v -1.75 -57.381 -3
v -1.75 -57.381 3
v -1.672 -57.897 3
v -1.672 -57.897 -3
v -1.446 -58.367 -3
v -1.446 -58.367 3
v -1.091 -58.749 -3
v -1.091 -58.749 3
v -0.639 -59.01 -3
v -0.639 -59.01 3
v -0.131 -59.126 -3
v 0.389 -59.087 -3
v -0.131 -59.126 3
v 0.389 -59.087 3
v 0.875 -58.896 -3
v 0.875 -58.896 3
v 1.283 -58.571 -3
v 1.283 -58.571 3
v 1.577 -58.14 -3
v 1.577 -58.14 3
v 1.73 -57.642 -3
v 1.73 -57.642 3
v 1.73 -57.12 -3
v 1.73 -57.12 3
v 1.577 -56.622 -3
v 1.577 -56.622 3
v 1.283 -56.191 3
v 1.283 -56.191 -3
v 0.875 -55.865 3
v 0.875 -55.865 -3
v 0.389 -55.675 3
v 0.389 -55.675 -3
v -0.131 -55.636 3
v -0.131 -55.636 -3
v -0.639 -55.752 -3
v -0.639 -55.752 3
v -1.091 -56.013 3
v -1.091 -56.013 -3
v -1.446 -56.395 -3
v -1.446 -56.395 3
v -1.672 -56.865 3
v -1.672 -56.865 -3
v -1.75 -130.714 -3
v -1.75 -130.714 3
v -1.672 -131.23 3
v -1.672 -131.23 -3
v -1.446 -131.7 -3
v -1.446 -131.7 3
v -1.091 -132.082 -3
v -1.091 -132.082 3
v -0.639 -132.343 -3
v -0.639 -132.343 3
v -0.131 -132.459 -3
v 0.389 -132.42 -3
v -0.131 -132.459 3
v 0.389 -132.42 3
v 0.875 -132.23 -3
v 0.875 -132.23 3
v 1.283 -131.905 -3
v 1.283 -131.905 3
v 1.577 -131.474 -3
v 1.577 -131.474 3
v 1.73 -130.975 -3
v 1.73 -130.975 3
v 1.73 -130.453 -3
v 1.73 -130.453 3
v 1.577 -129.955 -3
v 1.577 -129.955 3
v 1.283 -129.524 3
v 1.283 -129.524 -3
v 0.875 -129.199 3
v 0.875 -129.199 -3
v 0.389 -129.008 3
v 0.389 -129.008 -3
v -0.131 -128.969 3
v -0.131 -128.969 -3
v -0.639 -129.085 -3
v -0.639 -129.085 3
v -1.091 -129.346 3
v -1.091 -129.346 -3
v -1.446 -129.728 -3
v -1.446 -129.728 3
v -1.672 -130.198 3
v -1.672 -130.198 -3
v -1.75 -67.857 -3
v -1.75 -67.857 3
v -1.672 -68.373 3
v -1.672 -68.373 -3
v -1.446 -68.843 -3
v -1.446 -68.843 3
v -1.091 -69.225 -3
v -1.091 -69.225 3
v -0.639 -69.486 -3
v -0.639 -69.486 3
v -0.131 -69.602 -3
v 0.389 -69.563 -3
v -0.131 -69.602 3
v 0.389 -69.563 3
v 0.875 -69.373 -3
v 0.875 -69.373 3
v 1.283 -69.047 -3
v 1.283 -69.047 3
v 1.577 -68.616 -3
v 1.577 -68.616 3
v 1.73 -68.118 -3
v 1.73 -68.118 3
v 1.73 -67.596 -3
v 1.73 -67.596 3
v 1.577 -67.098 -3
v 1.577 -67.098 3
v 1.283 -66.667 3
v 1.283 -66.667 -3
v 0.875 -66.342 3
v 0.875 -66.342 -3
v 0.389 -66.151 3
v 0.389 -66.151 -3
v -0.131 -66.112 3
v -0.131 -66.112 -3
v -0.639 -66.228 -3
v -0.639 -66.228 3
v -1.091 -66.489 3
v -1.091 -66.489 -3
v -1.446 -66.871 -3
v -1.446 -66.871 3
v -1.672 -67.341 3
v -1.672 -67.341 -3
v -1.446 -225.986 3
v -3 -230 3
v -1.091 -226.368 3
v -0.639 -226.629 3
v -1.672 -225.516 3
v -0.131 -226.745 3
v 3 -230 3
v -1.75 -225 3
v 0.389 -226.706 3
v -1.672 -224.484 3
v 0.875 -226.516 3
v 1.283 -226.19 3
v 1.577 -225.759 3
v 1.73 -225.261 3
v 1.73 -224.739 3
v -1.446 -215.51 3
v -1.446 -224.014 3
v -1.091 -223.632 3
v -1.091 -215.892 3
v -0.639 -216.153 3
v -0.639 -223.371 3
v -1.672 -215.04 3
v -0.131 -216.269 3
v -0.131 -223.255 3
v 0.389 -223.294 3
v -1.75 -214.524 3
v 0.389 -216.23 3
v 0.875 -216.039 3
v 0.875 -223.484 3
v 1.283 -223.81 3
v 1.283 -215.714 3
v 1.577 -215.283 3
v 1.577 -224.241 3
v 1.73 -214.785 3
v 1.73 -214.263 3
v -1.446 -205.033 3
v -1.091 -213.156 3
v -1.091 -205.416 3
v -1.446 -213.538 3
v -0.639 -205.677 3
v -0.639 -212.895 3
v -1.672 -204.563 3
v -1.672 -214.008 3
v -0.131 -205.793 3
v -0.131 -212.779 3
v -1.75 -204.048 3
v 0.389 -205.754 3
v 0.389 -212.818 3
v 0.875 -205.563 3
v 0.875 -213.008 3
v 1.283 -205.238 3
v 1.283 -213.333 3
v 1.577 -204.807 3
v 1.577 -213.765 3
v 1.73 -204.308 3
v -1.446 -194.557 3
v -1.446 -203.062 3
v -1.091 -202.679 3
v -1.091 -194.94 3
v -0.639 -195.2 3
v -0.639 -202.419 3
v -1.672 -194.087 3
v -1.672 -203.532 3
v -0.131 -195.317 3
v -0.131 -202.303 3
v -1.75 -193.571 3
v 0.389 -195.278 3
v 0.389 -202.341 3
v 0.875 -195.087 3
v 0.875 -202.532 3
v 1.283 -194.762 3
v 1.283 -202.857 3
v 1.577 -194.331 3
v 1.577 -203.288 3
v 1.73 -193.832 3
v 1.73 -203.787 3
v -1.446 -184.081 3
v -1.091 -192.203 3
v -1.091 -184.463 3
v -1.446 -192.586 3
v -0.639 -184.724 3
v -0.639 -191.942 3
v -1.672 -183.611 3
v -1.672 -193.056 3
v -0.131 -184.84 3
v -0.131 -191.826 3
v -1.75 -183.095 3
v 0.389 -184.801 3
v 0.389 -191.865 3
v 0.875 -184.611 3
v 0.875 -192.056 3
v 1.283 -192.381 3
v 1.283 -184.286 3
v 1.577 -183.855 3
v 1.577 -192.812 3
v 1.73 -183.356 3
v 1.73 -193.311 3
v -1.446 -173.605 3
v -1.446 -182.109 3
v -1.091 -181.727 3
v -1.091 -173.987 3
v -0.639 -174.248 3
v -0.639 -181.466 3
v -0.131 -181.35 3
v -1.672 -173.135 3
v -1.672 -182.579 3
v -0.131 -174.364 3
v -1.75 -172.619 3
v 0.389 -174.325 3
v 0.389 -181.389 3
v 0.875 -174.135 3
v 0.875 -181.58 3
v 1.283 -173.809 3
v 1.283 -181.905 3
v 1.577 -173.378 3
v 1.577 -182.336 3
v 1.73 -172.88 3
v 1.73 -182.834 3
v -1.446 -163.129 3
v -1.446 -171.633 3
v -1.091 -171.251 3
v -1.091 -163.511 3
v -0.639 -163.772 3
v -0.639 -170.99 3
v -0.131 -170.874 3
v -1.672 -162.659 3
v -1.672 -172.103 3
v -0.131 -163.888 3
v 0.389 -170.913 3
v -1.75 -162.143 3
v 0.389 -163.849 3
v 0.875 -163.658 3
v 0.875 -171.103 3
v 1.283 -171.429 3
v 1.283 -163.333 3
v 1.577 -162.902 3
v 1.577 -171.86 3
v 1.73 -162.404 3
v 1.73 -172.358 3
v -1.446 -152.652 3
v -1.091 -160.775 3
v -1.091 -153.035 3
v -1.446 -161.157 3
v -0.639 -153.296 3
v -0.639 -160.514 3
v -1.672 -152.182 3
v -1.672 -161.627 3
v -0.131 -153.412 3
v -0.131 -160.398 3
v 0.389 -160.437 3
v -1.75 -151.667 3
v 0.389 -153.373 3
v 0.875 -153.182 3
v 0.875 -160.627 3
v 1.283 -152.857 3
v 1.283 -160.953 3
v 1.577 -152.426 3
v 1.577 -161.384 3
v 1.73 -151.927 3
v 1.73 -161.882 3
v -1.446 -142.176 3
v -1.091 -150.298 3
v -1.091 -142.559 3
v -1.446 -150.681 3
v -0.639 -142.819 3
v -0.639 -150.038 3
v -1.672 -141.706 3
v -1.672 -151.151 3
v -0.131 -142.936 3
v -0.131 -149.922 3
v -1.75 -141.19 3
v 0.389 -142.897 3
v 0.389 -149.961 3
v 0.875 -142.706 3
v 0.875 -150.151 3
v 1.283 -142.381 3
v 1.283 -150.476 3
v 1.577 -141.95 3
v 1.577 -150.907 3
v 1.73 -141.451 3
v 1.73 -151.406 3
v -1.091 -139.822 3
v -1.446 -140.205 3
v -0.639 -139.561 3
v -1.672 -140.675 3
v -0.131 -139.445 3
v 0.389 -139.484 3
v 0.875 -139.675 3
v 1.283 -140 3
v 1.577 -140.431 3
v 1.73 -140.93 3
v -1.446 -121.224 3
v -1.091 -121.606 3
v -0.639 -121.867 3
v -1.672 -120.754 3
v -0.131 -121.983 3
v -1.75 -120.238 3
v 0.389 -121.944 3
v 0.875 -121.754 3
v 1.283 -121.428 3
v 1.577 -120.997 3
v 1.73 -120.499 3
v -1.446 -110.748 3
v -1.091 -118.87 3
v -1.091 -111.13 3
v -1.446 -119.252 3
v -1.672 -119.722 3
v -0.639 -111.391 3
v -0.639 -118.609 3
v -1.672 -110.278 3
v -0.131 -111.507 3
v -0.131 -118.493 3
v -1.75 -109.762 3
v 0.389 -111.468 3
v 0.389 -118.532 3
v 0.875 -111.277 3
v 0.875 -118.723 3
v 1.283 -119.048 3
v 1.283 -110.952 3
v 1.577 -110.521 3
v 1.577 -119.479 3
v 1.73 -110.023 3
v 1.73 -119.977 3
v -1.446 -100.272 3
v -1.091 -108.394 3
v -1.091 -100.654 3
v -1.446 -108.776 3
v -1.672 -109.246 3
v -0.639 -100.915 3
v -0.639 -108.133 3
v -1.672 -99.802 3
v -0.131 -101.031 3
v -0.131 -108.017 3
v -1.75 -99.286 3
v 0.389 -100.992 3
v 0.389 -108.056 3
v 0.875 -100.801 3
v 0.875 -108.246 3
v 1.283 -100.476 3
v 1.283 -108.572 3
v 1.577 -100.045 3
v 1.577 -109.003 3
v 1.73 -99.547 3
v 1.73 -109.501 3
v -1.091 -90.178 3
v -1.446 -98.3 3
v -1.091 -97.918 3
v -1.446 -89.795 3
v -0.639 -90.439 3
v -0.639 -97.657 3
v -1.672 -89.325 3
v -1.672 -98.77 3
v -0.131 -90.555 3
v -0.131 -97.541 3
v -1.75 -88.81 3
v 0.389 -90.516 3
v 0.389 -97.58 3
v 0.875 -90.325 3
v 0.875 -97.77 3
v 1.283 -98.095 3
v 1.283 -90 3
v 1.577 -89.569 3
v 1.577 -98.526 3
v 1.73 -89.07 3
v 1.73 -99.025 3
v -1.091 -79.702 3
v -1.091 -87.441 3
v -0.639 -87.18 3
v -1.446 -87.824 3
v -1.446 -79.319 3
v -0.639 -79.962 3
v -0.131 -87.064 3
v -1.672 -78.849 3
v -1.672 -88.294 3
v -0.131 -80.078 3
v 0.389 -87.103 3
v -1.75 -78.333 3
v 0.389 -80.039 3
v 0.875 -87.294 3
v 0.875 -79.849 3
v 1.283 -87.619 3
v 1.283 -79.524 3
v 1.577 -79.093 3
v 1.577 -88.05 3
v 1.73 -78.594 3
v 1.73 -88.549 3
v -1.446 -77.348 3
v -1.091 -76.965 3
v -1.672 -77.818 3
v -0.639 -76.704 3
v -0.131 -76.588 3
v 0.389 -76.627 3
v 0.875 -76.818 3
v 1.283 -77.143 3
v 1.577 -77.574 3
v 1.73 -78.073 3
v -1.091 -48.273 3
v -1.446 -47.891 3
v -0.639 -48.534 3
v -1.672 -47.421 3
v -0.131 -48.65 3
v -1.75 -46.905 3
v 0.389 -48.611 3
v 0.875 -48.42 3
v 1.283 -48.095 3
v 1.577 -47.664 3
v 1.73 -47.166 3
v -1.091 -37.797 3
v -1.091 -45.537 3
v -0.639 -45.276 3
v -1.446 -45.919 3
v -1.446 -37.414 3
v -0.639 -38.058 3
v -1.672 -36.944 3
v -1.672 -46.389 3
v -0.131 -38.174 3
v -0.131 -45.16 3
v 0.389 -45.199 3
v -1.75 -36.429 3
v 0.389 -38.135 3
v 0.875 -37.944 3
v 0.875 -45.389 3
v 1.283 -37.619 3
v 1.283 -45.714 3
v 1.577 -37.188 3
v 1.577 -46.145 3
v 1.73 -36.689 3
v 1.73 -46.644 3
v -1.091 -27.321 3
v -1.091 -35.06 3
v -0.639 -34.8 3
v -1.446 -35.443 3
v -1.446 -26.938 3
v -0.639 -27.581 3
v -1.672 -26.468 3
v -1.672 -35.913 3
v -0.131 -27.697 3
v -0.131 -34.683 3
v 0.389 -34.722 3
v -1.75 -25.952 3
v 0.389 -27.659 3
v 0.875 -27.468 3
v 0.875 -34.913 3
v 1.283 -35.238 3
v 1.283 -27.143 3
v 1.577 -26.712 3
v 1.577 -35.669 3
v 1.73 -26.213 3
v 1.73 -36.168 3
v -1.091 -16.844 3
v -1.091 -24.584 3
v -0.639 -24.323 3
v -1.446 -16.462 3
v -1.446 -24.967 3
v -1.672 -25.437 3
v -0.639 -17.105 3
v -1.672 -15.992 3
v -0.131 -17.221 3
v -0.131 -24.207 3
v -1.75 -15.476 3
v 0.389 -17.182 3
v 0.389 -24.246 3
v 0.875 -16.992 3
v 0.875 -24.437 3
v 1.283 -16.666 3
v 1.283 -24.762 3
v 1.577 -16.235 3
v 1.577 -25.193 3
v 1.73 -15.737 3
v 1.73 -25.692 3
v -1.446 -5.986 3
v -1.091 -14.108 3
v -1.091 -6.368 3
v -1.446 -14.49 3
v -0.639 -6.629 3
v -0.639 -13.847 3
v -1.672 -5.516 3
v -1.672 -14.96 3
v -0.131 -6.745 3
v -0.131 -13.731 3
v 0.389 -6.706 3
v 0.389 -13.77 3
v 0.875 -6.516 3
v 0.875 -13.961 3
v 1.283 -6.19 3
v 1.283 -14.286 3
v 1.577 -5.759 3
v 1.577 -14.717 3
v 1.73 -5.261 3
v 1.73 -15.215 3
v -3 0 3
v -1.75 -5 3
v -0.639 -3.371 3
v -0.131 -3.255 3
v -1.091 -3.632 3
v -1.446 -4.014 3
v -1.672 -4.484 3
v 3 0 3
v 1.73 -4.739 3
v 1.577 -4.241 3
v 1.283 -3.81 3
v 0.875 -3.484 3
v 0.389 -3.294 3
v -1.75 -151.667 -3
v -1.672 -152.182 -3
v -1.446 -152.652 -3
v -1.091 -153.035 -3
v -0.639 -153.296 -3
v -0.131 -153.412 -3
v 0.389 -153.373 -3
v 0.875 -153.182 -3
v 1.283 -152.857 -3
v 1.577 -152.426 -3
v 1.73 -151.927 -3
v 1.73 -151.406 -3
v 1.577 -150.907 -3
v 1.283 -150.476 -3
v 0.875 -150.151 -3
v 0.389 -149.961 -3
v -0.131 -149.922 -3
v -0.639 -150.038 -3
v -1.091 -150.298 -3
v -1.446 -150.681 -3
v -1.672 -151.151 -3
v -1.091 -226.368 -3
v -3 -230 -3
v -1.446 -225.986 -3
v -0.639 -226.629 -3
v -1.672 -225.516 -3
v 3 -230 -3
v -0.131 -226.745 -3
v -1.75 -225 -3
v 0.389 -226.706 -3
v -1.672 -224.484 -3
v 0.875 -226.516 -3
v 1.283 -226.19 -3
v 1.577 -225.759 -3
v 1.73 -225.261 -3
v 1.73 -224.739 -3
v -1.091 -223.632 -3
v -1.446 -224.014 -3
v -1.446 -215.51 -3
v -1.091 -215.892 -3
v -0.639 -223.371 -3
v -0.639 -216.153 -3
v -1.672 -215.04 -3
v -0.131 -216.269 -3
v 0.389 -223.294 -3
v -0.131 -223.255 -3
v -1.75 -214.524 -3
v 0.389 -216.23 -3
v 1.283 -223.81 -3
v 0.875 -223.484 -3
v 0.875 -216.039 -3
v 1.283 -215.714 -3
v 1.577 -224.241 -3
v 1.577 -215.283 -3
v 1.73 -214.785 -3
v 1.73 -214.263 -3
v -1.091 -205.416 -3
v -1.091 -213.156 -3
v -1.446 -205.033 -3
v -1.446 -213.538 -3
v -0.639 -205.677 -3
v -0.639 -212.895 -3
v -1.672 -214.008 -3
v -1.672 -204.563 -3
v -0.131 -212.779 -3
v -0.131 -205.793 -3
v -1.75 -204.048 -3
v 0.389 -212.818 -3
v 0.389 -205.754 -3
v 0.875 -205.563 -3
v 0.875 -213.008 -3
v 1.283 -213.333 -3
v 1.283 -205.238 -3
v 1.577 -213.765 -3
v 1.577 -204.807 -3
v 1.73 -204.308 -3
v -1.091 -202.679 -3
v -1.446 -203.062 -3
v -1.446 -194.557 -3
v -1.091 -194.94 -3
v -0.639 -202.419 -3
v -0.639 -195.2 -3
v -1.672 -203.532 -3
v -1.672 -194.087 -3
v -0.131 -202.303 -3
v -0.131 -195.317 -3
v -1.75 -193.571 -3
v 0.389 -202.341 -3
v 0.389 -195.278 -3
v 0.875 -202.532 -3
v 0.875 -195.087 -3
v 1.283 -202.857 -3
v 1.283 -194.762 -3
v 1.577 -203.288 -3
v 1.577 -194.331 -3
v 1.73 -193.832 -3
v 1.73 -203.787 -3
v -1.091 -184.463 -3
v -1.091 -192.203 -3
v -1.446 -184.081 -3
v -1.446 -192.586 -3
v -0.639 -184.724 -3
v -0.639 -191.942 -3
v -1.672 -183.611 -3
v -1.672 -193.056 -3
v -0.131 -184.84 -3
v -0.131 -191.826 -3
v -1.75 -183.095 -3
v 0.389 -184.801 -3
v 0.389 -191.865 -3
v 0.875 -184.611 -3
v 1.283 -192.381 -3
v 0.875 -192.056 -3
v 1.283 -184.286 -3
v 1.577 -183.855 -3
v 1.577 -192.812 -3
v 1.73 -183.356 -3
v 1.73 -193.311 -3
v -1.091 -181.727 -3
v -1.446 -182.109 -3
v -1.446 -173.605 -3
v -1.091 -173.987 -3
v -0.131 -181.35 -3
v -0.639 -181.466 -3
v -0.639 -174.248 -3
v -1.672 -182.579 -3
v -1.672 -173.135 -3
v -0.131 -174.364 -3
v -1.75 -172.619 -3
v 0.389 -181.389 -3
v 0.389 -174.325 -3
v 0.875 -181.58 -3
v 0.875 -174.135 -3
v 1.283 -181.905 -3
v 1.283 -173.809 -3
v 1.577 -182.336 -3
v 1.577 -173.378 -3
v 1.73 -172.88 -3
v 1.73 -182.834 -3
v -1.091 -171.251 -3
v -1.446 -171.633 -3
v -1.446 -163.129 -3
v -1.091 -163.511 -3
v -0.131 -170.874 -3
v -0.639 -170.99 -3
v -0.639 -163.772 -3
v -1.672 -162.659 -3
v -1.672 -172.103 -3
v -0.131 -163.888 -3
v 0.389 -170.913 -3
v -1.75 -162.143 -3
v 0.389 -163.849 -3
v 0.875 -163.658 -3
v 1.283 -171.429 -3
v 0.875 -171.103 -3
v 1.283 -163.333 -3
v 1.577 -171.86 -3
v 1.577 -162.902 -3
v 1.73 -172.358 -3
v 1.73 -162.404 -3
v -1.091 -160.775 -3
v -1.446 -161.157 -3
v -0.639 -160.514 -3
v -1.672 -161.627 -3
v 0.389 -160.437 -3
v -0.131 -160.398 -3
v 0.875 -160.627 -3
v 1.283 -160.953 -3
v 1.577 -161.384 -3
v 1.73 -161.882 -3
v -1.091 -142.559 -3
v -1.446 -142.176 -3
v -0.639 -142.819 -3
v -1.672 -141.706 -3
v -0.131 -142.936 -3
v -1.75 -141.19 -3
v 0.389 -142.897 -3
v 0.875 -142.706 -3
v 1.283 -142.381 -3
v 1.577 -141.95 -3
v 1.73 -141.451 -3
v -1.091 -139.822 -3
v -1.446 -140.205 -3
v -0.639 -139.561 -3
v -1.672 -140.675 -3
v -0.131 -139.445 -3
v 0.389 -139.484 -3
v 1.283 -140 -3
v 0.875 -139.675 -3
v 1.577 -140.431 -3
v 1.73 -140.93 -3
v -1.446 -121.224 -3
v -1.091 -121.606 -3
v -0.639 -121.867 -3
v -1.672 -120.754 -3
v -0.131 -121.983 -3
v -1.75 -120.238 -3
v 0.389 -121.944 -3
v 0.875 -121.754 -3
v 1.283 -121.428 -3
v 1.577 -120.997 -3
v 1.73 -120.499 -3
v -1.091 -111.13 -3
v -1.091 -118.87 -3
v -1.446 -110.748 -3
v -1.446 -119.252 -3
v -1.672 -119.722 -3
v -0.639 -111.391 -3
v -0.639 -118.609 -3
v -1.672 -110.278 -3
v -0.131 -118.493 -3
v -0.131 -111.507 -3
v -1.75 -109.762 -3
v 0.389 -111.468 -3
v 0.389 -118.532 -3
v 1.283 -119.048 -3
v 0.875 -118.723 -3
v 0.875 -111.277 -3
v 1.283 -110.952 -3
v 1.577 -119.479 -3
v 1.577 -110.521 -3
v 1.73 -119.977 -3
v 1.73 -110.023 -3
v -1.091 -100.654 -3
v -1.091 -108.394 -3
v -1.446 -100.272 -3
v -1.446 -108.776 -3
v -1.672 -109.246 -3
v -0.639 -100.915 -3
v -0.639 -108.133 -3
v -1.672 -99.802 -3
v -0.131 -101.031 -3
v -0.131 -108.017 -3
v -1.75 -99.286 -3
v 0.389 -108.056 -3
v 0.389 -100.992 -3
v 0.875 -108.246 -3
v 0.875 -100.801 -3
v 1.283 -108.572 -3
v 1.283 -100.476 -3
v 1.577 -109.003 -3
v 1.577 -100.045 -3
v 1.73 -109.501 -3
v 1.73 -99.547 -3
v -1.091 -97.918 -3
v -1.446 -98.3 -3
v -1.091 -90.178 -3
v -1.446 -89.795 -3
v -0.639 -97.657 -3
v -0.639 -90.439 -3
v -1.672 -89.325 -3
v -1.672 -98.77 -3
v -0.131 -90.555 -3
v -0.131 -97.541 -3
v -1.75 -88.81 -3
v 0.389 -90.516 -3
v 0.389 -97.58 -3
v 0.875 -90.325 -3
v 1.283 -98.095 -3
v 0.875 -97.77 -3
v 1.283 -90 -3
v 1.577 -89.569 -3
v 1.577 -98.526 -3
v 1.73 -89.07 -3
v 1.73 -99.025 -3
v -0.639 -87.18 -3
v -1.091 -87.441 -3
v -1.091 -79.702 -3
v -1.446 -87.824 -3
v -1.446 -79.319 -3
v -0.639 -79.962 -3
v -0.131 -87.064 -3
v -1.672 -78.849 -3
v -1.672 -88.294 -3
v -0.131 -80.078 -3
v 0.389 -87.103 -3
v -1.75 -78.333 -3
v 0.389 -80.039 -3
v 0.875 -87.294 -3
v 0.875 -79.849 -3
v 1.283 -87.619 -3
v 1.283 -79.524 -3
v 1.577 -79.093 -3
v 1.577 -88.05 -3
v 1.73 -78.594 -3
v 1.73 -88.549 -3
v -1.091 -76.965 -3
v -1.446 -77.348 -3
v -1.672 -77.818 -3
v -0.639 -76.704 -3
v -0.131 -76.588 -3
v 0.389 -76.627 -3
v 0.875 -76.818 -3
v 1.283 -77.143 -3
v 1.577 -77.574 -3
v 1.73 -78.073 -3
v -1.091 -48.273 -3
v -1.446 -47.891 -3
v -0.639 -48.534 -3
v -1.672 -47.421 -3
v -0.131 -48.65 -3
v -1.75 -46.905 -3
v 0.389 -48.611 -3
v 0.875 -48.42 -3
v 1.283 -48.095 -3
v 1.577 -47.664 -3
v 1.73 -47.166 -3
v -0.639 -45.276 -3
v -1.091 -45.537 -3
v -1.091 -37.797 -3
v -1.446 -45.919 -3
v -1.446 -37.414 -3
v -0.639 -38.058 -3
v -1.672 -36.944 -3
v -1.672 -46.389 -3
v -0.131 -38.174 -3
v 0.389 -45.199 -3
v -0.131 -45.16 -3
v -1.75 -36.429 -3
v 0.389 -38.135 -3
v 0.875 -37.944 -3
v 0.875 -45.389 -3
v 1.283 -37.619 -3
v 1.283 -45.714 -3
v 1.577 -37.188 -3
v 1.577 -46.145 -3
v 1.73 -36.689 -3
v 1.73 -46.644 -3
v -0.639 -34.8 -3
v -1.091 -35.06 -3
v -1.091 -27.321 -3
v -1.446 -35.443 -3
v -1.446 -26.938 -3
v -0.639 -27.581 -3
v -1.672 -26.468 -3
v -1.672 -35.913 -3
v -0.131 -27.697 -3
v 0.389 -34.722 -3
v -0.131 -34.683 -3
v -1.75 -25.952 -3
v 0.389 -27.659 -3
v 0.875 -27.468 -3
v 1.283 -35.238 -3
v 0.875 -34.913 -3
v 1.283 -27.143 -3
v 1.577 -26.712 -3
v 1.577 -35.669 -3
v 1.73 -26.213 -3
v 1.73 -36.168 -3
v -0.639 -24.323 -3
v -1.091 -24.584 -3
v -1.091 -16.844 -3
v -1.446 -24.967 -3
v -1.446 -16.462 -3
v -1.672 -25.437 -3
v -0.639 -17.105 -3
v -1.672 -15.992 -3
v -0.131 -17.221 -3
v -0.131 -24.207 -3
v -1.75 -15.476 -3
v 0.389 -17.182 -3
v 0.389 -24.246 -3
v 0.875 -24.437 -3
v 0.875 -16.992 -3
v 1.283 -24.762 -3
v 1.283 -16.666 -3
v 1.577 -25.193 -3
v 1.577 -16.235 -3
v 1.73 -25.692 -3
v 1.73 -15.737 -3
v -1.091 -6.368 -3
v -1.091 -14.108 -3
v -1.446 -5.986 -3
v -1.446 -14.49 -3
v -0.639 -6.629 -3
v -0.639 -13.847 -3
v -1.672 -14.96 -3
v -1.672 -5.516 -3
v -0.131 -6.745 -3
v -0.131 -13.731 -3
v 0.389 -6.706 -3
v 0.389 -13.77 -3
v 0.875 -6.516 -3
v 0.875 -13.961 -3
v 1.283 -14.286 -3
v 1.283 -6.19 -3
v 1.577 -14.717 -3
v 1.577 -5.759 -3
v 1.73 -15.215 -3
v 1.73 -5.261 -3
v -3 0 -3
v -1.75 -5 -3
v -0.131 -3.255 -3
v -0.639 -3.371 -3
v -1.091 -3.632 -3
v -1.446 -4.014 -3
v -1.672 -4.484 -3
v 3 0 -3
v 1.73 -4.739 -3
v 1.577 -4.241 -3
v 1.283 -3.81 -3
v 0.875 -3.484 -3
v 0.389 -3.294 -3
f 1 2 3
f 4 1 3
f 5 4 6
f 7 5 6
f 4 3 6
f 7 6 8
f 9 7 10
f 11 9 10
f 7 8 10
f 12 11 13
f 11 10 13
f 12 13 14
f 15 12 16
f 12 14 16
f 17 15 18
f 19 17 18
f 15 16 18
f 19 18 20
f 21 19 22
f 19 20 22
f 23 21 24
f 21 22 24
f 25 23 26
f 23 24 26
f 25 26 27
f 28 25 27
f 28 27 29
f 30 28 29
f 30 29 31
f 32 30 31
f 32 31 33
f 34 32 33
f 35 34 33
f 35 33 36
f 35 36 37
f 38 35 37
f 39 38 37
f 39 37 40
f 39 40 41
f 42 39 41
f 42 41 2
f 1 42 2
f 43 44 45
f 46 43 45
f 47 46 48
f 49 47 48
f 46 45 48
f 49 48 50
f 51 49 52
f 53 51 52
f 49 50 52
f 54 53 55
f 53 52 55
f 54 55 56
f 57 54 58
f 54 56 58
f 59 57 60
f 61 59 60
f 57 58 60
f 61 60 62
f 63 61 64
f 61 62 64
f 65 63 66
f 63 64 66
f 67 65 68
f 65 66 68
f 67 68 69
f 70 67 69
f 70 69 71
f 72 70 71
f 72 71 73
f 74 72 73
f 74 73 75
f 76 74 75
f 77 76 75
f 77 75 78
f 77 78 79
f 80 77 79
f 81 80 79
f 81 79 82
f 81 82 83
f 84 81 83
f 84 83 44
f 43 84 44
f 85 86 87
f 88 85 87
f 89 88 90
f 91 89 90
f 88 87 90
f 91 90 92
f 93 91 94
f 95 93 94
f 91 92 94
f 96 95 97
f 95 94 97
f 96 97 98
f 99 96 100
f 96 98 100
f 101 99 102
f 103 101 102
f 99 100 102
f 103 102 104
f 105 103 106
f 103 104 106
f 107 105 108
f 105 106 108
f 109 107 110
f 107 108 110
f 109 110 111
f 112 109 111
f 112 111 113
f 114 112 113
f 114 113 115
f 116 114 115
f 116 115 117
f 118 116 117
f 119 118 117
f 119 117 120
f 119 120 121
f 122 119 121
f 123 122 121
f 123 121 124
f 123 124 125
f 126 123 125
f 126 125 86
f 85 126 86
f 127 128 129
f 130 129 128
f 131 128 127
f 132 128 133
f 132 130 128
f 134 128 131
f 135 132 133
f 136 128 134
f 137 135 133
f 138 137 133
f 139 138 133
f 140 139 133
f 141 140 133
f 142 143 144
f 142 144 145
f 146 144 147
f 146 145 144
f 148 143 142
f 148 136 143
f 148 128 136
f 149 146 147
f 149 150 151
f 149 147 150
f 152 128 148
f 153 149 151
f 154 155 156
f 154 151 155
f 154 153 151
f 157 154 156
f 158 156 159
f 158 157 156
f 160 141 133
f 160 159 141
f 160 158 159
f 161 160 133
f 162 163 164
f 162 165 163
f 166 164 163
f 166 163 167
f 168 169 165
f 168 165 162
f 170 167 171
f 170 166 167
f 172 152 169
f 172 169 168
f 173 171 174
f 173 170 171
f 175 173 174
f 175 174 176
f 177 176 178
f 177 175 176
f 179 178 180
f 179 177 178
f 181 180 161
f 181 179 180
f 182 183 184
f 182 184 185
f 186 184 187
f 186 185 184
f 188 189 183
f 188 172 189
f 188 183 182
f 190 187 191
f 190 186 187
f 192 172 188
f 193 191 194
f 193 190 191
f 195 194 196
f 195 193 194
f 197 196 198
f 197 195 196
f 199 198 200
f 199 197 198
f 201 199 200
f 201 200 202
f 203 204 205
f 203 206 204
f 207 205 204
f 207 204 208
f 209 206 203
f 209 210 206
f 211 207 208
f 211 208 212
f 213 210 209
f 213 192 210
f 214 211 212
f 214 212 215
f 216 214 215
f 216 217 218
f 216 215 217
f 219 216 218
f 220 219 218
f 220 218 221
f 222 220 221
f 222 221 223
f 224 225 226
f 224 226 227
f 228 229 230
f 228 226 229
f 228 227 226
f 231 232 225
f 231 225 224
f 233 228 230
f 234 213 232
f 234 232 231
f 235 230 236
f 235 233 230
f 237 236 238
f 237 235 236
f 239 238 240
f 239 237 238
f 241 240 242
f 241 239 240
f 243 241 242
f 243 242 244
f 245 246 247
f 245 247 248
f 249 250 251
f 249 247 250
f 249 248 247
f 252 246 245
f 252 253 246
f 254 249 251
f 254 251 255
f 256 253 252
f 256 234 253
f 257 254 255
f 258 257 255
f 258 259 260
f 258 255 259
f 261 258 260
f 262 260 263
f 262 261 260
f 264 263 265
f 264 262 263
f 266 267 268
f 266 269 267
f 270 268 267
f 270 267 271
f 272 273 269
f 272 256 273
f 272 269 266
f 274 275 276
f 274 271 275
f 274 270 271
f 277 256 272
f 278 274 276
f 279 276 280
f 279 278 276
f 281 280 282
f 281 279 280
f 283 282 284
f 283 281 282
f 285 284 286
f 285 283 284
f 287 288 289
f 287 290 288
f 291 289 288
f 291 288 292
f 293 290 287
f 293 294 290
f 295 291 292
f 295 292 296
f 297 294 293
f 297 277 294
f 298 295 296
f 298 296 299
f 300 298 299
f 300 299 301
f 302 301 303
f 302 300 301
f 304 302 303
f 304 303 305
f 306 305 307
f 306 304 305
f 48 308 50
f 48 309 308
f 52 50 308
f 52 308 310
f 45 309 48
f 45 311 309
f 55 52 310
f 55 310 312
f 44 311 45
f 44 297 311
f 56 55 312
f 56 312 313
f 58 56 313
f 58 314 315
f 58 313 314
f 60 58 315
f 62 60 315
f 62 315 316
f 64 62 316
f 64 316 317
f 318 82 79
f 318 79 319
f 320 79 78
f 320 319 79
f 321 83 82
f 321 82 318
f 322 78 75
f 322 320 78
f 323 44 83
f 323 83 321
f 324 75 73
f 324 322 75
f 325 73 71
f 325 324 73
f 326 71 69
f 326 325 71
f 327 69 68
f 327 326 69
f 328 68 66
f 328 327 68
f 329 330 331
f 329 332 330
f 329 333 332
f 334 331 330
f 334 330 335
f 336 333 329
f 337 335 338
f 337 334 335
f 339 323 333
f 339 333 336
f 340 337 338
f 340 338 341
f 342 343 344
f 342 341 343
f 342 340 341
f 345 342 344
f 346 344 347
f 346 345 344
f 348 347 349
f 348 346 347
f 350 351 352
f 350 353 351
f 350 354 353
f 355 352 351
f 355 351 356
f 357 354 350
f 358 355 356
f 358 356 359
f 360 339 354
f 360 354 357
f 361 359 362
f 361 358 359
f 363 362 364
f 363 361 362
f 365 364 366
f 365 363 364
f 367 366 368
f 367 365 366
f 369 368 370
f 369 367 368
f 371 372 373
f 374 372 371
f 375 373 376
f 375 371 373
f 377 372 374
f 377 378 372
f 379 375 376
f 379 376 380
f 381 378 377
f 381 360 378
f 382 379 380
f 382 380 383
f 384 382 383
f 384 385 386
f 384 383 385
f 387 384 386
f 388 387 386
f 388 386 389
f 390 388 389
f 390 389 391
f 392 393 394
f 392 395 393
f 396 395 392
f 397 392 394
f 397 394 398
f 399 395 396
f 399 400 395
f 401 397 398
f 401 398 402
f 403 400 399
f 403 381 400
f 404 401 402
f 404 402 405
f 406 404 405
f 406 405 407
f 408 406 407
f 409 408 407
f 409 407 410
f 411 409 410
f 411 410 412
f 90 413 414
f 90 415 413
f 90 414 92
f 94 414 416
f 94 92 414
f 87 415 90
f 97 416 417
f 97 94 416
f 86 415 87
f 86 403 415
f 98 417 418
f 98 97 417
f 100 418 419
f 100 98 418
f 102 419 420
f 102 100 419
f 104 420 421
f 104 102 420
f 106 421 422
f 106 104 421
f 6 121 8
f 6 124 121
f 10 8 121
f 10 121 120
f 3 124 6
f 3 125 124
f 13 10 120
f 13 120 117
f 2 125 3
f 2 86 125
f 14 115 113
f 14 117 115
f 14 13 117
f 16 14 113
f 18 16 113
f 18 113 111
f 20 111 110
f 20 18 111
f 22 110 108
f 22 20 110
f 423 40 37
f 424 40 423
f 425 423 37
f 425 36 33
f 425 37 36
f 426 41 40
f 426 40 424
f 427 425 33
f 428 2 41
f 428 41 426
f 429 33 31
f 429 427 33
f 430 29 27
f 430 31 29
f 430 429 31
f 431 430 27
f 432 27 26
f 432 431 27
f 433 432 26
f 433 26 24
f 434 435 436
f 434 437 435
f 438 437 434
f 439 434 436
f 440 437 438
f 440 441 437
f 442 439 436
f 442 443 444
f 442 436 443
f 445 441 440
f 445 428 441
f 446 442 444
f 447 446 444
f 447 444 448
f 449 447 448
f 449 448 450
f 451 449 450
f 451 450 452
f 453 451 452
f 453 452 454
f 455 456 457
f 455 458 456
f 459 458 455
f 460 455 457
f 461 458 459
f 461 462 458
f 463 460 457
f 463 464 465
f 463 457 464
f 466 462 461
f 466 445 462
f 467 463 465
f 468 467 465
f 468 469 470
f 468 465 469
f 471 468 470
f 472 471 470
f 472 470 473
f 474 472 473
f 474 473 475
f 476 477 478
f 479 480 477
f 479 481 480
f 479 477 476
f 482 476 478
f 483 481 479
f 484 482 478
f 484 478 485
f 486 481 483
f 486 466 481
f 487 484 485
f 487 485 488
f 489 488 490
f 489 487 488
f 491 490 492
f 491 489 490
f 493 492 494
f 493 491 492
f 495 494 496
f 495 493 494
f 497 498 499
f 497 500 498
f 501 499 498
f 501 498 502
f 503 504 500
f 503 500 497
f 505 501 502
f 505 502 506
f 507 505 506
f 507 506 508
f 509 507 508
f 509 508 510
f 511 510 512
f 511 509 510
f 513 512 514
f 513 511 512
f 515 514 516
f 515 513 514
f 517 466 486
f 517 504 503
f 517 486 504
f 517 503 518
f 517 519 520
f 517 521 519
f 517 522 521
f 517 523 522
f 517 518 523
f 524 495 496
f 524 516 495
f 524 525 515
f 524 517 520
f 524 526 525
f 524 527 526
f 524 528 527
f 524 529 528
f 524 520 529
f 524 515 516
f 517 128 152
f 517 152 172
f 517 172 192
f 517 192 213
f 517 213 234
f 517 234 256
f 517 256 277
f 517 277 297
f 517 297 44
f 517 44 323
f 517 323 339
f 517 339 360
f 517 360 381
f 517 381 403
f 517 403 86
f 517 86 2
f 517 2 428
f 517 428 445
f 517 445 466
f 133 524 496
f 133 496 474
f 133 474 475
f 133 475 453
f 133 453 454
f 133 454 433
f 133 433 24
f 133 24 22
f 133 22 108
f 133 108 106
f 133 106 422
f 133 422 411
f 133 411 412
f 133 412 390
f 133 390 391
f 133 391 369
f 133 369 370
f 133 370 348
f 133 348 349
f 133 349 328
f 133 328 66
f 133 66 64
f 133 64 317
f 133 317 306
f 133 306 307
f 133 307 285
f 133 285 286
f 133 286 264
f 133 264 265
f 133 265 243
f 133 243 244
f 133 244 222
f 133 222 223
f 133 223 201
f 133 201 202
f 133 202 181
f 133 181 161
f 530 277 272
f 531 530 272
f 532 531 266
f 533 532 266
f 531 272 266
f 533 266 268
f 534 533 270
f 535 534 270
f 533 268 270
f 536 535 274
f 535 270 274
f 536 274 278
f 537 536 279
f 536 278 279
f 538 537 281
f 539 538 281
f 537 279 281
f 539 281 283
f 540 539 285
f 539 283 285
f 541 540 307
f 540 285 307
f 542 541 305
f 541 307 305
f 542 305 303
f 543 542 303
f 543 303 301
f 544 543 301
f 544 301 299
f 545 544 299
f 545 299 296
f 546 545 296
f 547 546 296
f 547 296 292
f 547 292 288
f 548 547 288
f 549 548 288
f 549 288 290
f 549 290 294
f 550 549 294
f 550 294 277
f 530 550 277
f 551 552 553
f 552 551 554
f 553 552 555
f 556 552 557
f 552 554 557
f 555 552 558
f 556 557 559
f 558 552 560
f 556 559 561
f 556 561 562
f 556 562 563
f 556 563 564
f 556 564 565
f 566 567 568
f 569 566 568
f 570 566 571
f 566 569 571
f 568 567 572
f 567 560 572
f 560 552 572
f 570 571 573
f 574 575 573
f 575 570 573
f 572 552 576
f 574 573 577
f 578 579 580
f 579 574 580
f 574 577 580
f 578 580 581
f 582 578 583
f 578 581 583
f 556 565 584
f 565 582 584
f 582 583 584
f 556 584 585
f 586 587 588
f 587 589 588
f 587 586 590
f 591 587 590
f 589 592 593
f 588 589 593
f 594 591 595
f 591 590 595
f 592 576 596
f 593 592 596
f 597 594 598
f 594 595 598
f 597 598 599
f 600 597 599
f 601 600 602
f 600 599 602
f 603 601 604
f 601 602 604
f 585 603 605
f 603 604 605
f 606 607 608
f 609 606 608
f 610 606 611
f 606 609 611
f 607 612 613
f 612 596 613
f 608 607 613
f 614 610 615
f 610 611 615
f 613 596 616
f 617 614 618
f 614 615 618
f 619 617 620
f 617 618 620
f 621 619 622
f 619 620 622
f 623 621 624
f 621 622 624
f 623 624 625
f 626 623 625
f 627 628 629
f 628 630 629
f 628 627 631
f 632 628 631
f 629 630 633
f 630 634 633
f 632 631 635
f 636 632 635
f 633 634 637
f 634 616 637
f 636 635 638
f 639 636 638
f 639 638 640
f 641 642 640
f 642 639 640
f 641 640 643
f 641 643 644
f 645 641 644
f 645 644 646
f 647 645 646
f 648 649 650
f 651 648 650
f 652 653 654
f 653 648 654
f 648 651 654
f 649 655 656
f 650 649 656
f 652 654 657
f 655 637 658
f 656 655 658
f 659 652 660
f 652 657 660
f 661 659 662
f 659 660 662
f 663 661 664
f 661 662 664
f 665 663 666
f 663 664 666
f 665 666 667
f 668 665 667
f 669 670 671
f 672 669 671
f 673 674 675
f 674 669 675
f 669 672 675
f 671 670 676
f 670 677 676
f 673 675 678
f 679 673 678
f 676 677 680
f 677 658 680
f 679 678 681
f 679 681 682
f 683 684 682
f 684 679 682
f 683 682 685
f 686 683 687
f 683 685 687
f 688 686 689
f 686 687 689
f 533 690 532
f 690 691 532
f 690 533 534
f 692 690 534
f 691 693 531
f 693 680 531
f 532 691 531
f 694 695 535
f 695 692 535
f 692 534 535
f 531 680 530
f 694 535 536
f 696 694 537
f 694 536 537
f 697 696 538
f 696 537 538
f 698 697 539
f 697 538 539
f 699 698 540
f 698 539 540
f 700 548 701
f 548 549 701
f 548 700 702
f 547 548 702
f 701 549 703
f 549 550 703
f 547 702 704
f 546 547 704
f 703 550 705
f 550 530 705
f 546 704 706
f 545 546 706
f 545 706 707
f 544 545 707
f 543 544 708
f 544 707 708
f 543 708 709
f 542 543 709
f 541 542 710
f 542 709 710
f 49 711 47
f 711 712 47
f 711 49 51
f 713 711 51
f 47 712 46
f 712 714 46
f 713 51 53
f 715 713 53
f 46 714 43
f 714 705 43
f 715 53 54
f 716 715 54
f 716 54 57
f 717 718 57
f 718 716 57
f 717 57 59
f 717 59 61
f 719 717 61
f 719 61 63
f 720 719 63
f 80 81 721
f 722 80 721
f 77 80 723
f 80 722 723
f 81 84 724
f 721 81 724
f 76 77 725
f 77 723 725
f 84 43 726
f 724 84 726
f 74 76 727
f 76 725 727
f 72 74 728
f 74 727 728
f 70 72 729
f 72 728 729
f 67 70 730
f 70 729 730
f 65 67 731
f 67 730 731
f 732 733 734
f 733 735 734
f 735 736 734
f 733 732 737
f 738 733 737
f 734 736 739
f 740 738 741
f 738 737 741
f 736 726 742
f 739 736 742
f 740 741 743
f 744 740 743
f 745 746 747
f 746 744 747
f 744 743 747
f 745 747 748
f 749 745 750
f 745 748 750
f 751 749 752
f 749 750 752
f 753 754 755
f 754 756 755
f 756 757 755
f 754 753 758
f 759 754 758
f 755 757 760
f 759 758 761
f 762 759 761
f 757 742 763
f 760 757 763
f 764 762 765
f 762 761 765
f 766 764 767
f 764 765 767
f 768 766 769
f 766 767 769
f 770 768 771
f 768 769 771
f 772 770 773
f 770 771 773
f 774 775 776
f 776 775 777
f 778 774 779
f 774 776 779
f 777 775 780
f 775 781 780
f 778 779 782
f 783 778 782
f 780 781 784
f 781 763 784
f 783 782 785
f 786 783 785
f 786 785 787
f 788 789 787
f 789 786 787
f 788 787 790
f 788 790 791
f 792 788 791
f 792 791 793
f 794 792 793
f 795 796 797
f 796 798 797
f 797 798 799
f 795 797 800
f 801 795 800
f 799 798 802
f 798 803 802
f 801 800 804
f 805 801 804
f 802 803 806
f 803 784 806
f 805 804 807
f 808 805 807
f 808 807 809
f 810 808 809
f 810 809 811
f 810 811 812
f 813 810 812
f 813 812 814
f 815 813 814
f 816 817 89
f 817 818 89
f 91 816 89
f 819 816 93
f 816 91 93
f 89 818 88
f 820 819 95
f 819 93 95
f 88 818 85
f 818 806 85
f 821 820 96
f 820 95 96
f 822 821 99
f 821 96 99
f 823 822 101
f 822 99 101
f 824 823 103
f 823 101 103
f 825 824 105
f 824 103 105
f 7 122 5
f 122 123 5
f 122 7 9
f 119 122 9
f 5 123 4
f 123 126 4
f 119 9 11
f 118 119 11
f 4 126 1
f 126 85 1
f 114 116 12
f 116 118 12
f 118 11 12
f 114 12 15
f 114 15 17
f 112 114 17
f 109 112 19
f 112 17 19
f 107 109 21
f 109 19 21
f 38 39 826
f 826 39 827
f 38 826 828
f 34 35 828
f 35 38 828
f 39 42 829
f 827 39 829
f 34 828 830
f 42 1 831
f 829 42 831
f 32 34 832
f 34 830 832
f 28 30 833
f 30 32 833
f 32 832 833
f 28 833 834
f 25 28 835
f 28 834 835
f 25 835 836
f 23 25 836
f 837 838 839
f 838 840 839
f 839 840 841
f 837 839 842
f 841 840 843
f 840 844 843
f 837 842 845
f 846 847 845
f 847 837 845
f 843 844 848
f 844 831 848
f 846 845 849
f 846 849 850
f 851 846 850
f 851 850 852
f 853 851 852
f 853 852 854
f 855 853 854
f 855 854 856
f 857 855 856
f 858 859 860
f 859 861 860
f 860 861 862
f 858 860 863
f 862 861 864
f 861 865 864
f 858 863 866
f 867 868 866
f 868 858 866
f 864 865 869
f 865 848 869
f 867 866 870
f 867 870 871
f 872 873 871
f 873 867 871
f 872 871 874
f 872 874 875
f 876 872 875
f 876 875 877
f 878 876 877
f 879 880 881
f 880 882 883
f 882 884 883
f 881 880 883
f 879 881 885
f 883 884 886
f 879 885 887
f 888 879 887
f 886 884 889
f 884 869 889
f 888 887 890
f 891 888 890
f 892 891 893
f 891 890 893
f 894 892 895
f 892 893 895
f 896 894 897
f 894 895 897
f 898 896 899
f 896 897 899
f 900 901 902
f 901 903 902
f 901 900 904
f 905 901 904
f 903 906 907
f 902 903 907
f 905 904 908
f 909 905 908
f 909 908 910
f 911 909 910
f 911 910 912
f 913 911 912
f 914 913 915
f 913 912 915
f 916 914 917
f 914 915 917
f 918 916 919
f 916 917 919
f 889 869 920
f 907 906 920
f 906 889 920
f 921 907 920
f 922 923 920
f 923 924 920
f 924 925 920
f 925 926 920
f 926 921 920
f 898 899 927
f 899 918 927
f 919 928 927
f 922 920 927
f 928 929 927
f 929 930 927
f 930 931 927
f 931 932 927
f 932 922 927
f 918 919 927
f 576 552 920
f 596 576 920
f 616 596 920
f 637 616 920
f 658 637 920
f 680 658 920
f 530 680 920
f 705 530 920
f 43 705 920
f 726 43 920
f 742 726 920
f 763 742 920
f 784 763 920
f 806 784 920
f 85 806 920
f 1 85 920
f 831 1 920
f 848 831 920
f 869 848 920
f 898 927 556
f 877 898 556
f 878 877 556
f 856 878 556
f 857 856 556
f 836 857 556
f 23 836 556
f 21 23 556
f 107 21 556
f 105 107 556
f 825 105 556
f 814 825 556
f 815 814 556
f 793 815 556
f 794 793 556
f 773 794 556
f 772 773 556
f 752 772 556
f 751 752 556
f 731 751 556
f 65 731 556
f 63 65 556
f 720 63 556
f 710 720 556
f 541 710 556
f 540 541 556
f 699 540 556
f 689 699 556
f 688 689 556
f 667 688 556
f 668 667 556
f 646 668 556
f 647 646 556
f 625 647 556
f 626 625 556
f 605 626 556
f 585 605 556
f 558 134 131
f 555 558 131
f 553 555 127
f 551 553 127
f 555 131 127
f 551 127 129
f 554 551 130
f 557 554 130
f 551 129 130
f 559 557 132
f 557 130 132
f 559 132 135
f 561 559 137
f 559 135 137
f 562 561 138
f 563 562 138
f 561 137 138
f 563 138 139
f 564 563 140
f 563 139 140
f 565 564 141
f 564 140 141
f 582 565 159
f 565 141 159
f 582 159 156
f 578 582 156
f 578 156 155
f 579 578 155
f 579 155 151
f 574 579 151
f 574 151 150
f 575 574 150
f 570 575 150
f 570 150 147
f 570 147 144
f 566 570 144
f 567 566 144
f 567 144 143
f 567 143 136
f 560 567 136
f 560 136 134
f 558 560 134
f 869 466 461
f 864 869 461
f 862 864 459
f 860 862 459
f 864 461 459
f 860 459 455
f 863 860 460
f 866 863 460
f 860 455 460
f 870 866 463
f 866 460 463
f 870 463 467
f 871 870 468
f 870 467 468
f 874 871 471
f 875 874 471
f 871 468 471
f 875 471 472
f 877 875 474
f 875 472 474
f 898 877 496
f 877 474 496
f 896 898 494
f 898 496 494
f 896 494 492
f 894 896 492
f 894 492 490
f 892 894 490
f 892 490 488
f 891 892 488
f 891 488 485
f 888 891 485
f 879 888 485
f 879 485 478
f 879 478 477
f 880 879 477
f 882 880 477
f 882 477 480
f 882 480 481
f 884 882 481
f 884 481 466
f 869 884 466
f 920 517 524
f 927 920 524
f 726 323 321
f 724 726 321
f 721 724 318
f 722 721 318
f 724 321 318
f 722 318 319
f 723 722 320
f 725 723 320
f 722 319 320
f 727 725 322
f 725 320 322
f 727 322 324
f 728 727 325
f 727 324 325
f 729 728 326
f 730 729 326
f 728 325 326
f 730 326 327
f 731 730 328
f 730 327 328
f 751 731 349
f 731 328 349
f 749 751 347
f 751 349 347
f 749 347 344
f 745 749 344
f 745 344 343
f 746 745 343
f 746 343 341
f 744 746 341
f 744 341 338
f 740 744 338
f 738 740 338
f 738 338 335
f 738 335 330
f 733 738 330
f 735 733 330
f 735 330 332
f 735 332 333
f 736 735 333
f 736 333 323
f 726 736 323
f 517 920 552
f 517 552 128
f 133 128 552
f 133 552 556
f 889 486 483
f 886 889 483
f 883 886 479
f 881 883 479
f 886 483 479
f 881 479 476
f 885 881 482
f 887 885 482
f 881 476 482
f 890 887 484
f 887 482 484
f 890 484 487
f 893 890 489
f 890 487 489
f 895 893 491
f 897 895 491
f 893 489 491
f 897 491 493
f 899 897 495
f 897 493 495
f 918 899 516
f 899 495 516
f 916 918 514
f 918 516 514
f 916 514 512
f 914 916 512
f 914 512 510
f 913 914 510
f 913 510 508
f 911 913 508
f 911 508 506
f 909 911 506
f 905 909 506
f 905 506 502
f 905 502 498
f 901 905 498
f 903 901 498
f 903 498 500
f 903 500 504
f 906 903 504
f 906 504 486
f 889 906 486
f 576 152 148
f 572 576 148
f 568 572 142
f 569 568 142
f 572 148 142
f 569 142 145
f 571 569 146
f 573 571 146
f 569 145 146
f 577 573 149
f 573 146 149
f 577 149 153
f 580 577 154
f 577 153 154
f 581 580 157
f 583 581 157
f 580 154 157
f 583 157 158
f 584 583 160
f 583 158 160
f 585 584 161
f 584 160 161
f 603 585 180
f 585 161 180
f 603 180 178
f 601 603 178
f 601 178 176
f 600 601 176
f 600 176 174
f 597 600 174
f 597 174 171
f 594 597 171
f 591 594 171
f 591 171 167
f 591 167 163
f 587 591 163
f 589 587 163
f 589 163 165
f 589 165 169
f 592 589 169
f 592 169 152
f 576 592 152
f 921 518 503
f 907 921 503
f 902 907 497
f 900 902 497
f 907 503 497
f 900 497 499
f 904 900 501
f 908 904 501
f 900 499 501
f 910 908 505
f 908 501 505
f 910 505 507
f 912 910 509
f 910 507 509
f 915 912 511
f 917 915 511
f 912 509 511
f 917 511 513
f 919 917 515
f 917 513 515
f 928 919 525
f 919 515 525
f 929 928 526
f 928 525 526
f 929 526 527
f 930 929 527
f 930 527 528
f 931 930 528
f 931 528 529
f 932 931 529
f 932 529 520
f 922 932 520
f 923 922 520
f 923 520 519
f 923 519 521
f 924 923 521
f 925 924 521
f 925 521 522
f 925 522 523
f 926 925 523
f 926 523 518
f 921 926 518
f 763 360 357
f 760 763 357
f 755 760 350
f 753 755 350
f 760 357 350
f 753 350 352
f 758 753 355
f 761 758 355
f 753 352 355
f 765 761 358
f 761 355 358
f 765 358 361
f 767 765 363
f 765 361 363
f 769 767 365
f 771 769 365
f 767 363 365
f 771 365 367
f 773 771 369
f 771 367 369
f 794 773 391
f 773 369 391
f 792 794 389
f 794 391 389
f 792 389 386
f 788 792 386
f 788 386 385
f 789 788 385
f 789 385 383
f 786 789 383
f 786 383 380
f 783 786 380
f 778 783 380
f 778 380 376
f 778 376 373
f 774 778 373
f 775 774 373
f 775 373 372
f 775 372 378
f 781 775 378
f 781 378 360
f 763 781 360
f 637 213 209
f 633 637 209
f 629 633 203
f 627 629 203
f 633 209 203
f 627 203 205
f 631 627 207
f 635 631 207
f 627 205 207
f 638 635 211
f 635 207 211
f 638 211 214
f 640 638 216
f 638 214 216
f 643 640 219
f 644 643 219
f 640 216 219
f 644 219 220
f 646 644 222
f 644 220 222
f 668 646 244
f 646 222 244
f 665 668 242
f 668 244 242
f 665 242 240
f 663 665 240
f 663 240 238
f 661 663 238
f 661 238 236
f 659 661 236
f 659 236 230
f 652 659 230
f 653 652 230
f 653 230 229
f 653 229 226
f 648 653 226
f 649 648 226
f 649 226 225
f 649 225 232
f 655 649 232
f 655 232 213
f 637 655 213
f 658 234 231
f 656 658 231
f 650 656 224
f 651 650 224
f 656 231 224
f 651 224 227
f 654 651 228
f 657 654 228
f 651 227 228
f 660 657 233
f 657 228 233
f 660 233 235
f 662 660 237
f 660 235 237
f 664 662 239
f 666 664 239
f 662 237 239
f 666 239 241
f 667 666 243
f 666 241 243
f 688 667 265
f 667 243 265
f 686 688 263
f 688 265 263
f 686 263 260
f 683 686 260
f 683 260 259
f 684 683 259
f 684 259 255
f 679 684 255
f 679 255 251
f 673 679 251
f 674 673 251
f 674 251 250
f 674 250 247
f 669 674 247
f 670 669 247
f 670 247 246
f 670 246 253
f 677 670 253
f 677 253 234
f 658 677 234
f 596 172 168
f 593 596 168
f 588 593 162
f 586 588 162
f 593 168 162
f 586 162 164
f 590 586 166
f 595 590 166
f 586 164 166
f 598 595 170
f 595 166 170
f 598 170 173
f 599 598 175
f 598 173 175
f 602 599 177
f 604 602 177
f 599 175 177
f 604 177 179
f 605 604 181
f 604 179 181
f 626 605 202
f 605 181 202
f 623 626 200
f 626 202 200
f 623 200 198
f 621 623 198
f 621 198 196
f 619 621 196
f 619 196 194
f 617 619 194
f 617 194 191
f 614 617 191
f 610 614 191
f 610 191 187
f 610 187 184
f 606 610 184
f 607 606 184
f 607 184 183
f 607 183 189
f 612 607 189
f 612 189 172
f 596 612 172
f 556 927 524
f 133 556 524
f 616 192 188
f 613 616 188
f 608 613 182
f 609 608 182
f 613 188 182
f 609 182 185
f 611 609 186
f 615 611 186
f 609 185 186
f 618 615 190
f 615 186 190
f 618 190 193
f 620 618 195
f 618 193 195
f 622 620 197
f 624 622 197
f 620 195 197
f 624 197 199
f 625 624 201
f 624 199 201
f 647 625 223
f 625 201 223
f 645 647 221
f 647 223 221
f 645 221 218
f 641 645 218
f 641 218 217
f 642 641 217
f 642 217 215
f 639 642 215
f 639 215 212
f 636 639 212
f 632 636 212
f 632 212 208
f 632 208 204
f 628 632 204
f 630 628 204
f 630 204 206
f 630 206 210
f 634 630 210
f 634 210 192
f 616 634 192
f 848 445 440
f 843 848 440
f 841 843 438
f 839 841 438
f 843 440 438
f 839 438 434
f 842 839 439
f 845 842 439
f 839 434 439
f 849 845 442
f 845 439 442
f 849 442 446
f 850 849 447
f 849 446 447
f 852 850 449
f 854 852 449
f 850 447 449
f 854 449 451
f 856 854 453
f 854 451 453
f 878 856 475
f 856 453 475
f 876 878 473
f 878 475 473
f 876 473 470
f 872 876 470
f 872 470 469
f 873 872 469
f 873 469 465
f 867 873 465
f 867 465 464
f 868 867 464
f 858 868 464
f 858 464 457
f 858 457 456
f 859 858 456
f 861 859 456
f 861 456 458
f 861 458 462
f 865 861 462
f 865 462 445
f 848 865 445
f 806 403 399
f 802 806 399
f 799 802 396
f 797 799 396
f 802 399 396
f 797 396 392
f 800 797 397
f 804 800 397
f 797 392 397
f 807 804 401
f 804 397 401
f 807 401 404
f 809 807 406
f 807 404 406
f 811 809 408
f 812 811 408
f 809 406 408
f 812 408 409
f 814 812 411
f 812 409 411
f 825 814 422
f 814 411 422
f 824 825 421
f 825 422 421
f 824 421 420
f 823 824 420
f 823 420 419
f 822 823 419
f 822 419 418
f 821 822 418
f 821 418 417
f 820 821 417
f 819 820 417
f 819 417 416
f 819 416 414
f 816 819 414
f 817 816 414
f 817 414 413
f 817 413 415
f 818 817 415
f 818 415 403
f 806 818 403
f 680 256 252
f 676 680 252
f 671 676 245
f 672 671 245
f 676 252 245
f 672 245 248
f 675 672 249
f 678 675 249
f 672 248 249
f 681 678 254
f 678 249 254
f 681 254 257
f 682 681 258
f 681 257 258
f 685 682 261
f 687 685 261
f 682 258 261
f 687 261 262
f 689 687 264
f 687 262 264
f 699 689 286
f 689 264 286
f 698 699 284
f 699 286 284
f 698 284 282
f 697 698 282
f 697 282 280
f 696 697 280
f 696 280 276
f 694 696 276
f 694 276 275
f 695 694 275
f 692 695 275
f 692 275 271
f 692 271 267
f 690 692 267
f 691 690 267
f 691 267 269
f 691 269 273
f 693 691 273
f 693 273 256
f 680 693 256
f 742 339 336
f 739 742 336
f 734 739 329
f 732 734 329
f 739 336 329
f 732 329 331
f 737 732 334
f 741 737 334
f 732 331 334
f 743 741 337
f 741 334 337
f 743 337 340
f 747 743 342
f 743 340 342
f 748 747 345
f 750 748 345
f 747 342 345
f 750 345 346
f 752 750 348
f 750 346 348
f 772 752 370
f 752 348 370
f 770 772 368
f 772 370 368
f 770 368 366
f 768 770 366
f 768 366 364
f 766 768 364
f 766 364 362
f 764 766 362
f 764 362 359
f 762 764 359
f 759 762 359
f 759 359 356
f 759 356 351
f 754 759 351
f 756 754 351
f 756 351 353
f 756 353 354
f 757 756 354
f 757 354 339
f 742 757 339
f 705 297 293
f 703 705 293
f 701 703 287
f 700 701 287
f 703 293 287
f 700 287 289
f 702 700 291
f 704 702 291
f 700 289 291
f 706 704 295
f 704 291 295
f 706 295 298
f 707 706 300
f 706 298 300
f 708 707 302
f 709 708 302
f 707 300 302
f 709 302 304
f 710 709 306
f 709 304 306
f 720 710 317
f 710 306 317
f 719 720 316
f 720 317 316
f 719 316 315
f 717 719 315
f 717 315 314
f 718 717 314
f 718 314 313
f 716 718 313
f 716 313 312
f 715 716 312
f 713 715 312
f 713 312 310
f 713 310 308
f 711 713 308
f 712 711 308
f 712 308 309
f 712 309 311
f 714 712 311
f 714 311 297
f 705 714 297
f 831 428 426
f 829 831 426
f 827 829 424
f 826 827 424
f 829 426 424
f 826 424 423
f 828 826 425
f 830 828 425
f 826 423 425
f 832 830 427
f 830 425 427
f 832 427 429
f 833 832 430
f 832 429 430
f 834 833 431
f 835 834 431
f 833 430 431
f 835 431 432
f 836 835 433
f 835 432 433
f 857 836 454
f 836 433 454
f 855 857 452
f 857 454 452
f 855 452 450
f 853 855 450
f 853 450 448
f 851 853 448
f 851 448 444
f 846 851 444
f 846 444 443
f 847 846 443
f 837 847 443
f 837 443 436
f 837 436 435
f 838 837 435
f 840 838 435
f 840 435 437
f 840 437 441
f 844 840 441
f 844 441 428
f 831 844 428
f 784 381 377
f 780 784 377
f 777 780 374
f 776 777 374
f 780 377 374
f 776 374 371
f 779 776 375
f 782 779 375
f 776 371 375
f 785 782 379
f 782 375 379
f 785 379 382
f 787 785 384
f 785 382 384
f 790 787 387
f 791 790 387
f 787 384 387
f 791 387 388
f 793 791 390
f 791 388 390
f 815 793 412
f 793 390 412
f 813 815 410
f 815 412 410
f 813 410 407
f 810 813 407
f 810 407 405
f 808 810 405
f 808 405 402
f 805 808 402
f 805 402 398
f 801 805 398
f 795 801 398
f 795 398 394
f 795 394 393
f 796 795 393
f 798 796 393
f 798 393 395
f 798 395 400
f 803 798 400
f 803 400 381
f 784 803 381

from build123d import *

# Parameters (mm, degrees)
SKETCH_W            = 6
SKETCH_H            = 6
PAD_DEPTH           = 230
SKETCH001_R         = 1.75
POCKET_DEPTH        = 6.001
LINEARPATTERN_COUNT = 22
LINEARPATTERN_PITCH = 10.47619


with BuildPart() as part:
    # Sketch → Pad (new body)
    with BuildSketch(Plane.XZ):
        Rectangle(SKETCH_W, SKETCH_H)
    extrude(amount=PAD_DEPTH)

    # Sketch001 → Pocket (cut, through all)
    with BuildSketch(Plane(origin=(0, 0, 3), x_dir=(-1, 0, 0), z_dir=(0, 0, 1))):
        with Locations((0, 5)):
            Circle(SKETCH001_R)
    pocket = extrude(amount=-POCKET_DEPTH, mode=Mode.SUBTRACT)

    # LinearPattern: Pocket ×22
    with Locations(*[(0, -i * LINEARPATTERN_PITCH, 0) for i in range(1, LINEARPATTERN_COUNT)]):
        add(pocket, mode=Mode.SUBTRACT)


solid = part.part
